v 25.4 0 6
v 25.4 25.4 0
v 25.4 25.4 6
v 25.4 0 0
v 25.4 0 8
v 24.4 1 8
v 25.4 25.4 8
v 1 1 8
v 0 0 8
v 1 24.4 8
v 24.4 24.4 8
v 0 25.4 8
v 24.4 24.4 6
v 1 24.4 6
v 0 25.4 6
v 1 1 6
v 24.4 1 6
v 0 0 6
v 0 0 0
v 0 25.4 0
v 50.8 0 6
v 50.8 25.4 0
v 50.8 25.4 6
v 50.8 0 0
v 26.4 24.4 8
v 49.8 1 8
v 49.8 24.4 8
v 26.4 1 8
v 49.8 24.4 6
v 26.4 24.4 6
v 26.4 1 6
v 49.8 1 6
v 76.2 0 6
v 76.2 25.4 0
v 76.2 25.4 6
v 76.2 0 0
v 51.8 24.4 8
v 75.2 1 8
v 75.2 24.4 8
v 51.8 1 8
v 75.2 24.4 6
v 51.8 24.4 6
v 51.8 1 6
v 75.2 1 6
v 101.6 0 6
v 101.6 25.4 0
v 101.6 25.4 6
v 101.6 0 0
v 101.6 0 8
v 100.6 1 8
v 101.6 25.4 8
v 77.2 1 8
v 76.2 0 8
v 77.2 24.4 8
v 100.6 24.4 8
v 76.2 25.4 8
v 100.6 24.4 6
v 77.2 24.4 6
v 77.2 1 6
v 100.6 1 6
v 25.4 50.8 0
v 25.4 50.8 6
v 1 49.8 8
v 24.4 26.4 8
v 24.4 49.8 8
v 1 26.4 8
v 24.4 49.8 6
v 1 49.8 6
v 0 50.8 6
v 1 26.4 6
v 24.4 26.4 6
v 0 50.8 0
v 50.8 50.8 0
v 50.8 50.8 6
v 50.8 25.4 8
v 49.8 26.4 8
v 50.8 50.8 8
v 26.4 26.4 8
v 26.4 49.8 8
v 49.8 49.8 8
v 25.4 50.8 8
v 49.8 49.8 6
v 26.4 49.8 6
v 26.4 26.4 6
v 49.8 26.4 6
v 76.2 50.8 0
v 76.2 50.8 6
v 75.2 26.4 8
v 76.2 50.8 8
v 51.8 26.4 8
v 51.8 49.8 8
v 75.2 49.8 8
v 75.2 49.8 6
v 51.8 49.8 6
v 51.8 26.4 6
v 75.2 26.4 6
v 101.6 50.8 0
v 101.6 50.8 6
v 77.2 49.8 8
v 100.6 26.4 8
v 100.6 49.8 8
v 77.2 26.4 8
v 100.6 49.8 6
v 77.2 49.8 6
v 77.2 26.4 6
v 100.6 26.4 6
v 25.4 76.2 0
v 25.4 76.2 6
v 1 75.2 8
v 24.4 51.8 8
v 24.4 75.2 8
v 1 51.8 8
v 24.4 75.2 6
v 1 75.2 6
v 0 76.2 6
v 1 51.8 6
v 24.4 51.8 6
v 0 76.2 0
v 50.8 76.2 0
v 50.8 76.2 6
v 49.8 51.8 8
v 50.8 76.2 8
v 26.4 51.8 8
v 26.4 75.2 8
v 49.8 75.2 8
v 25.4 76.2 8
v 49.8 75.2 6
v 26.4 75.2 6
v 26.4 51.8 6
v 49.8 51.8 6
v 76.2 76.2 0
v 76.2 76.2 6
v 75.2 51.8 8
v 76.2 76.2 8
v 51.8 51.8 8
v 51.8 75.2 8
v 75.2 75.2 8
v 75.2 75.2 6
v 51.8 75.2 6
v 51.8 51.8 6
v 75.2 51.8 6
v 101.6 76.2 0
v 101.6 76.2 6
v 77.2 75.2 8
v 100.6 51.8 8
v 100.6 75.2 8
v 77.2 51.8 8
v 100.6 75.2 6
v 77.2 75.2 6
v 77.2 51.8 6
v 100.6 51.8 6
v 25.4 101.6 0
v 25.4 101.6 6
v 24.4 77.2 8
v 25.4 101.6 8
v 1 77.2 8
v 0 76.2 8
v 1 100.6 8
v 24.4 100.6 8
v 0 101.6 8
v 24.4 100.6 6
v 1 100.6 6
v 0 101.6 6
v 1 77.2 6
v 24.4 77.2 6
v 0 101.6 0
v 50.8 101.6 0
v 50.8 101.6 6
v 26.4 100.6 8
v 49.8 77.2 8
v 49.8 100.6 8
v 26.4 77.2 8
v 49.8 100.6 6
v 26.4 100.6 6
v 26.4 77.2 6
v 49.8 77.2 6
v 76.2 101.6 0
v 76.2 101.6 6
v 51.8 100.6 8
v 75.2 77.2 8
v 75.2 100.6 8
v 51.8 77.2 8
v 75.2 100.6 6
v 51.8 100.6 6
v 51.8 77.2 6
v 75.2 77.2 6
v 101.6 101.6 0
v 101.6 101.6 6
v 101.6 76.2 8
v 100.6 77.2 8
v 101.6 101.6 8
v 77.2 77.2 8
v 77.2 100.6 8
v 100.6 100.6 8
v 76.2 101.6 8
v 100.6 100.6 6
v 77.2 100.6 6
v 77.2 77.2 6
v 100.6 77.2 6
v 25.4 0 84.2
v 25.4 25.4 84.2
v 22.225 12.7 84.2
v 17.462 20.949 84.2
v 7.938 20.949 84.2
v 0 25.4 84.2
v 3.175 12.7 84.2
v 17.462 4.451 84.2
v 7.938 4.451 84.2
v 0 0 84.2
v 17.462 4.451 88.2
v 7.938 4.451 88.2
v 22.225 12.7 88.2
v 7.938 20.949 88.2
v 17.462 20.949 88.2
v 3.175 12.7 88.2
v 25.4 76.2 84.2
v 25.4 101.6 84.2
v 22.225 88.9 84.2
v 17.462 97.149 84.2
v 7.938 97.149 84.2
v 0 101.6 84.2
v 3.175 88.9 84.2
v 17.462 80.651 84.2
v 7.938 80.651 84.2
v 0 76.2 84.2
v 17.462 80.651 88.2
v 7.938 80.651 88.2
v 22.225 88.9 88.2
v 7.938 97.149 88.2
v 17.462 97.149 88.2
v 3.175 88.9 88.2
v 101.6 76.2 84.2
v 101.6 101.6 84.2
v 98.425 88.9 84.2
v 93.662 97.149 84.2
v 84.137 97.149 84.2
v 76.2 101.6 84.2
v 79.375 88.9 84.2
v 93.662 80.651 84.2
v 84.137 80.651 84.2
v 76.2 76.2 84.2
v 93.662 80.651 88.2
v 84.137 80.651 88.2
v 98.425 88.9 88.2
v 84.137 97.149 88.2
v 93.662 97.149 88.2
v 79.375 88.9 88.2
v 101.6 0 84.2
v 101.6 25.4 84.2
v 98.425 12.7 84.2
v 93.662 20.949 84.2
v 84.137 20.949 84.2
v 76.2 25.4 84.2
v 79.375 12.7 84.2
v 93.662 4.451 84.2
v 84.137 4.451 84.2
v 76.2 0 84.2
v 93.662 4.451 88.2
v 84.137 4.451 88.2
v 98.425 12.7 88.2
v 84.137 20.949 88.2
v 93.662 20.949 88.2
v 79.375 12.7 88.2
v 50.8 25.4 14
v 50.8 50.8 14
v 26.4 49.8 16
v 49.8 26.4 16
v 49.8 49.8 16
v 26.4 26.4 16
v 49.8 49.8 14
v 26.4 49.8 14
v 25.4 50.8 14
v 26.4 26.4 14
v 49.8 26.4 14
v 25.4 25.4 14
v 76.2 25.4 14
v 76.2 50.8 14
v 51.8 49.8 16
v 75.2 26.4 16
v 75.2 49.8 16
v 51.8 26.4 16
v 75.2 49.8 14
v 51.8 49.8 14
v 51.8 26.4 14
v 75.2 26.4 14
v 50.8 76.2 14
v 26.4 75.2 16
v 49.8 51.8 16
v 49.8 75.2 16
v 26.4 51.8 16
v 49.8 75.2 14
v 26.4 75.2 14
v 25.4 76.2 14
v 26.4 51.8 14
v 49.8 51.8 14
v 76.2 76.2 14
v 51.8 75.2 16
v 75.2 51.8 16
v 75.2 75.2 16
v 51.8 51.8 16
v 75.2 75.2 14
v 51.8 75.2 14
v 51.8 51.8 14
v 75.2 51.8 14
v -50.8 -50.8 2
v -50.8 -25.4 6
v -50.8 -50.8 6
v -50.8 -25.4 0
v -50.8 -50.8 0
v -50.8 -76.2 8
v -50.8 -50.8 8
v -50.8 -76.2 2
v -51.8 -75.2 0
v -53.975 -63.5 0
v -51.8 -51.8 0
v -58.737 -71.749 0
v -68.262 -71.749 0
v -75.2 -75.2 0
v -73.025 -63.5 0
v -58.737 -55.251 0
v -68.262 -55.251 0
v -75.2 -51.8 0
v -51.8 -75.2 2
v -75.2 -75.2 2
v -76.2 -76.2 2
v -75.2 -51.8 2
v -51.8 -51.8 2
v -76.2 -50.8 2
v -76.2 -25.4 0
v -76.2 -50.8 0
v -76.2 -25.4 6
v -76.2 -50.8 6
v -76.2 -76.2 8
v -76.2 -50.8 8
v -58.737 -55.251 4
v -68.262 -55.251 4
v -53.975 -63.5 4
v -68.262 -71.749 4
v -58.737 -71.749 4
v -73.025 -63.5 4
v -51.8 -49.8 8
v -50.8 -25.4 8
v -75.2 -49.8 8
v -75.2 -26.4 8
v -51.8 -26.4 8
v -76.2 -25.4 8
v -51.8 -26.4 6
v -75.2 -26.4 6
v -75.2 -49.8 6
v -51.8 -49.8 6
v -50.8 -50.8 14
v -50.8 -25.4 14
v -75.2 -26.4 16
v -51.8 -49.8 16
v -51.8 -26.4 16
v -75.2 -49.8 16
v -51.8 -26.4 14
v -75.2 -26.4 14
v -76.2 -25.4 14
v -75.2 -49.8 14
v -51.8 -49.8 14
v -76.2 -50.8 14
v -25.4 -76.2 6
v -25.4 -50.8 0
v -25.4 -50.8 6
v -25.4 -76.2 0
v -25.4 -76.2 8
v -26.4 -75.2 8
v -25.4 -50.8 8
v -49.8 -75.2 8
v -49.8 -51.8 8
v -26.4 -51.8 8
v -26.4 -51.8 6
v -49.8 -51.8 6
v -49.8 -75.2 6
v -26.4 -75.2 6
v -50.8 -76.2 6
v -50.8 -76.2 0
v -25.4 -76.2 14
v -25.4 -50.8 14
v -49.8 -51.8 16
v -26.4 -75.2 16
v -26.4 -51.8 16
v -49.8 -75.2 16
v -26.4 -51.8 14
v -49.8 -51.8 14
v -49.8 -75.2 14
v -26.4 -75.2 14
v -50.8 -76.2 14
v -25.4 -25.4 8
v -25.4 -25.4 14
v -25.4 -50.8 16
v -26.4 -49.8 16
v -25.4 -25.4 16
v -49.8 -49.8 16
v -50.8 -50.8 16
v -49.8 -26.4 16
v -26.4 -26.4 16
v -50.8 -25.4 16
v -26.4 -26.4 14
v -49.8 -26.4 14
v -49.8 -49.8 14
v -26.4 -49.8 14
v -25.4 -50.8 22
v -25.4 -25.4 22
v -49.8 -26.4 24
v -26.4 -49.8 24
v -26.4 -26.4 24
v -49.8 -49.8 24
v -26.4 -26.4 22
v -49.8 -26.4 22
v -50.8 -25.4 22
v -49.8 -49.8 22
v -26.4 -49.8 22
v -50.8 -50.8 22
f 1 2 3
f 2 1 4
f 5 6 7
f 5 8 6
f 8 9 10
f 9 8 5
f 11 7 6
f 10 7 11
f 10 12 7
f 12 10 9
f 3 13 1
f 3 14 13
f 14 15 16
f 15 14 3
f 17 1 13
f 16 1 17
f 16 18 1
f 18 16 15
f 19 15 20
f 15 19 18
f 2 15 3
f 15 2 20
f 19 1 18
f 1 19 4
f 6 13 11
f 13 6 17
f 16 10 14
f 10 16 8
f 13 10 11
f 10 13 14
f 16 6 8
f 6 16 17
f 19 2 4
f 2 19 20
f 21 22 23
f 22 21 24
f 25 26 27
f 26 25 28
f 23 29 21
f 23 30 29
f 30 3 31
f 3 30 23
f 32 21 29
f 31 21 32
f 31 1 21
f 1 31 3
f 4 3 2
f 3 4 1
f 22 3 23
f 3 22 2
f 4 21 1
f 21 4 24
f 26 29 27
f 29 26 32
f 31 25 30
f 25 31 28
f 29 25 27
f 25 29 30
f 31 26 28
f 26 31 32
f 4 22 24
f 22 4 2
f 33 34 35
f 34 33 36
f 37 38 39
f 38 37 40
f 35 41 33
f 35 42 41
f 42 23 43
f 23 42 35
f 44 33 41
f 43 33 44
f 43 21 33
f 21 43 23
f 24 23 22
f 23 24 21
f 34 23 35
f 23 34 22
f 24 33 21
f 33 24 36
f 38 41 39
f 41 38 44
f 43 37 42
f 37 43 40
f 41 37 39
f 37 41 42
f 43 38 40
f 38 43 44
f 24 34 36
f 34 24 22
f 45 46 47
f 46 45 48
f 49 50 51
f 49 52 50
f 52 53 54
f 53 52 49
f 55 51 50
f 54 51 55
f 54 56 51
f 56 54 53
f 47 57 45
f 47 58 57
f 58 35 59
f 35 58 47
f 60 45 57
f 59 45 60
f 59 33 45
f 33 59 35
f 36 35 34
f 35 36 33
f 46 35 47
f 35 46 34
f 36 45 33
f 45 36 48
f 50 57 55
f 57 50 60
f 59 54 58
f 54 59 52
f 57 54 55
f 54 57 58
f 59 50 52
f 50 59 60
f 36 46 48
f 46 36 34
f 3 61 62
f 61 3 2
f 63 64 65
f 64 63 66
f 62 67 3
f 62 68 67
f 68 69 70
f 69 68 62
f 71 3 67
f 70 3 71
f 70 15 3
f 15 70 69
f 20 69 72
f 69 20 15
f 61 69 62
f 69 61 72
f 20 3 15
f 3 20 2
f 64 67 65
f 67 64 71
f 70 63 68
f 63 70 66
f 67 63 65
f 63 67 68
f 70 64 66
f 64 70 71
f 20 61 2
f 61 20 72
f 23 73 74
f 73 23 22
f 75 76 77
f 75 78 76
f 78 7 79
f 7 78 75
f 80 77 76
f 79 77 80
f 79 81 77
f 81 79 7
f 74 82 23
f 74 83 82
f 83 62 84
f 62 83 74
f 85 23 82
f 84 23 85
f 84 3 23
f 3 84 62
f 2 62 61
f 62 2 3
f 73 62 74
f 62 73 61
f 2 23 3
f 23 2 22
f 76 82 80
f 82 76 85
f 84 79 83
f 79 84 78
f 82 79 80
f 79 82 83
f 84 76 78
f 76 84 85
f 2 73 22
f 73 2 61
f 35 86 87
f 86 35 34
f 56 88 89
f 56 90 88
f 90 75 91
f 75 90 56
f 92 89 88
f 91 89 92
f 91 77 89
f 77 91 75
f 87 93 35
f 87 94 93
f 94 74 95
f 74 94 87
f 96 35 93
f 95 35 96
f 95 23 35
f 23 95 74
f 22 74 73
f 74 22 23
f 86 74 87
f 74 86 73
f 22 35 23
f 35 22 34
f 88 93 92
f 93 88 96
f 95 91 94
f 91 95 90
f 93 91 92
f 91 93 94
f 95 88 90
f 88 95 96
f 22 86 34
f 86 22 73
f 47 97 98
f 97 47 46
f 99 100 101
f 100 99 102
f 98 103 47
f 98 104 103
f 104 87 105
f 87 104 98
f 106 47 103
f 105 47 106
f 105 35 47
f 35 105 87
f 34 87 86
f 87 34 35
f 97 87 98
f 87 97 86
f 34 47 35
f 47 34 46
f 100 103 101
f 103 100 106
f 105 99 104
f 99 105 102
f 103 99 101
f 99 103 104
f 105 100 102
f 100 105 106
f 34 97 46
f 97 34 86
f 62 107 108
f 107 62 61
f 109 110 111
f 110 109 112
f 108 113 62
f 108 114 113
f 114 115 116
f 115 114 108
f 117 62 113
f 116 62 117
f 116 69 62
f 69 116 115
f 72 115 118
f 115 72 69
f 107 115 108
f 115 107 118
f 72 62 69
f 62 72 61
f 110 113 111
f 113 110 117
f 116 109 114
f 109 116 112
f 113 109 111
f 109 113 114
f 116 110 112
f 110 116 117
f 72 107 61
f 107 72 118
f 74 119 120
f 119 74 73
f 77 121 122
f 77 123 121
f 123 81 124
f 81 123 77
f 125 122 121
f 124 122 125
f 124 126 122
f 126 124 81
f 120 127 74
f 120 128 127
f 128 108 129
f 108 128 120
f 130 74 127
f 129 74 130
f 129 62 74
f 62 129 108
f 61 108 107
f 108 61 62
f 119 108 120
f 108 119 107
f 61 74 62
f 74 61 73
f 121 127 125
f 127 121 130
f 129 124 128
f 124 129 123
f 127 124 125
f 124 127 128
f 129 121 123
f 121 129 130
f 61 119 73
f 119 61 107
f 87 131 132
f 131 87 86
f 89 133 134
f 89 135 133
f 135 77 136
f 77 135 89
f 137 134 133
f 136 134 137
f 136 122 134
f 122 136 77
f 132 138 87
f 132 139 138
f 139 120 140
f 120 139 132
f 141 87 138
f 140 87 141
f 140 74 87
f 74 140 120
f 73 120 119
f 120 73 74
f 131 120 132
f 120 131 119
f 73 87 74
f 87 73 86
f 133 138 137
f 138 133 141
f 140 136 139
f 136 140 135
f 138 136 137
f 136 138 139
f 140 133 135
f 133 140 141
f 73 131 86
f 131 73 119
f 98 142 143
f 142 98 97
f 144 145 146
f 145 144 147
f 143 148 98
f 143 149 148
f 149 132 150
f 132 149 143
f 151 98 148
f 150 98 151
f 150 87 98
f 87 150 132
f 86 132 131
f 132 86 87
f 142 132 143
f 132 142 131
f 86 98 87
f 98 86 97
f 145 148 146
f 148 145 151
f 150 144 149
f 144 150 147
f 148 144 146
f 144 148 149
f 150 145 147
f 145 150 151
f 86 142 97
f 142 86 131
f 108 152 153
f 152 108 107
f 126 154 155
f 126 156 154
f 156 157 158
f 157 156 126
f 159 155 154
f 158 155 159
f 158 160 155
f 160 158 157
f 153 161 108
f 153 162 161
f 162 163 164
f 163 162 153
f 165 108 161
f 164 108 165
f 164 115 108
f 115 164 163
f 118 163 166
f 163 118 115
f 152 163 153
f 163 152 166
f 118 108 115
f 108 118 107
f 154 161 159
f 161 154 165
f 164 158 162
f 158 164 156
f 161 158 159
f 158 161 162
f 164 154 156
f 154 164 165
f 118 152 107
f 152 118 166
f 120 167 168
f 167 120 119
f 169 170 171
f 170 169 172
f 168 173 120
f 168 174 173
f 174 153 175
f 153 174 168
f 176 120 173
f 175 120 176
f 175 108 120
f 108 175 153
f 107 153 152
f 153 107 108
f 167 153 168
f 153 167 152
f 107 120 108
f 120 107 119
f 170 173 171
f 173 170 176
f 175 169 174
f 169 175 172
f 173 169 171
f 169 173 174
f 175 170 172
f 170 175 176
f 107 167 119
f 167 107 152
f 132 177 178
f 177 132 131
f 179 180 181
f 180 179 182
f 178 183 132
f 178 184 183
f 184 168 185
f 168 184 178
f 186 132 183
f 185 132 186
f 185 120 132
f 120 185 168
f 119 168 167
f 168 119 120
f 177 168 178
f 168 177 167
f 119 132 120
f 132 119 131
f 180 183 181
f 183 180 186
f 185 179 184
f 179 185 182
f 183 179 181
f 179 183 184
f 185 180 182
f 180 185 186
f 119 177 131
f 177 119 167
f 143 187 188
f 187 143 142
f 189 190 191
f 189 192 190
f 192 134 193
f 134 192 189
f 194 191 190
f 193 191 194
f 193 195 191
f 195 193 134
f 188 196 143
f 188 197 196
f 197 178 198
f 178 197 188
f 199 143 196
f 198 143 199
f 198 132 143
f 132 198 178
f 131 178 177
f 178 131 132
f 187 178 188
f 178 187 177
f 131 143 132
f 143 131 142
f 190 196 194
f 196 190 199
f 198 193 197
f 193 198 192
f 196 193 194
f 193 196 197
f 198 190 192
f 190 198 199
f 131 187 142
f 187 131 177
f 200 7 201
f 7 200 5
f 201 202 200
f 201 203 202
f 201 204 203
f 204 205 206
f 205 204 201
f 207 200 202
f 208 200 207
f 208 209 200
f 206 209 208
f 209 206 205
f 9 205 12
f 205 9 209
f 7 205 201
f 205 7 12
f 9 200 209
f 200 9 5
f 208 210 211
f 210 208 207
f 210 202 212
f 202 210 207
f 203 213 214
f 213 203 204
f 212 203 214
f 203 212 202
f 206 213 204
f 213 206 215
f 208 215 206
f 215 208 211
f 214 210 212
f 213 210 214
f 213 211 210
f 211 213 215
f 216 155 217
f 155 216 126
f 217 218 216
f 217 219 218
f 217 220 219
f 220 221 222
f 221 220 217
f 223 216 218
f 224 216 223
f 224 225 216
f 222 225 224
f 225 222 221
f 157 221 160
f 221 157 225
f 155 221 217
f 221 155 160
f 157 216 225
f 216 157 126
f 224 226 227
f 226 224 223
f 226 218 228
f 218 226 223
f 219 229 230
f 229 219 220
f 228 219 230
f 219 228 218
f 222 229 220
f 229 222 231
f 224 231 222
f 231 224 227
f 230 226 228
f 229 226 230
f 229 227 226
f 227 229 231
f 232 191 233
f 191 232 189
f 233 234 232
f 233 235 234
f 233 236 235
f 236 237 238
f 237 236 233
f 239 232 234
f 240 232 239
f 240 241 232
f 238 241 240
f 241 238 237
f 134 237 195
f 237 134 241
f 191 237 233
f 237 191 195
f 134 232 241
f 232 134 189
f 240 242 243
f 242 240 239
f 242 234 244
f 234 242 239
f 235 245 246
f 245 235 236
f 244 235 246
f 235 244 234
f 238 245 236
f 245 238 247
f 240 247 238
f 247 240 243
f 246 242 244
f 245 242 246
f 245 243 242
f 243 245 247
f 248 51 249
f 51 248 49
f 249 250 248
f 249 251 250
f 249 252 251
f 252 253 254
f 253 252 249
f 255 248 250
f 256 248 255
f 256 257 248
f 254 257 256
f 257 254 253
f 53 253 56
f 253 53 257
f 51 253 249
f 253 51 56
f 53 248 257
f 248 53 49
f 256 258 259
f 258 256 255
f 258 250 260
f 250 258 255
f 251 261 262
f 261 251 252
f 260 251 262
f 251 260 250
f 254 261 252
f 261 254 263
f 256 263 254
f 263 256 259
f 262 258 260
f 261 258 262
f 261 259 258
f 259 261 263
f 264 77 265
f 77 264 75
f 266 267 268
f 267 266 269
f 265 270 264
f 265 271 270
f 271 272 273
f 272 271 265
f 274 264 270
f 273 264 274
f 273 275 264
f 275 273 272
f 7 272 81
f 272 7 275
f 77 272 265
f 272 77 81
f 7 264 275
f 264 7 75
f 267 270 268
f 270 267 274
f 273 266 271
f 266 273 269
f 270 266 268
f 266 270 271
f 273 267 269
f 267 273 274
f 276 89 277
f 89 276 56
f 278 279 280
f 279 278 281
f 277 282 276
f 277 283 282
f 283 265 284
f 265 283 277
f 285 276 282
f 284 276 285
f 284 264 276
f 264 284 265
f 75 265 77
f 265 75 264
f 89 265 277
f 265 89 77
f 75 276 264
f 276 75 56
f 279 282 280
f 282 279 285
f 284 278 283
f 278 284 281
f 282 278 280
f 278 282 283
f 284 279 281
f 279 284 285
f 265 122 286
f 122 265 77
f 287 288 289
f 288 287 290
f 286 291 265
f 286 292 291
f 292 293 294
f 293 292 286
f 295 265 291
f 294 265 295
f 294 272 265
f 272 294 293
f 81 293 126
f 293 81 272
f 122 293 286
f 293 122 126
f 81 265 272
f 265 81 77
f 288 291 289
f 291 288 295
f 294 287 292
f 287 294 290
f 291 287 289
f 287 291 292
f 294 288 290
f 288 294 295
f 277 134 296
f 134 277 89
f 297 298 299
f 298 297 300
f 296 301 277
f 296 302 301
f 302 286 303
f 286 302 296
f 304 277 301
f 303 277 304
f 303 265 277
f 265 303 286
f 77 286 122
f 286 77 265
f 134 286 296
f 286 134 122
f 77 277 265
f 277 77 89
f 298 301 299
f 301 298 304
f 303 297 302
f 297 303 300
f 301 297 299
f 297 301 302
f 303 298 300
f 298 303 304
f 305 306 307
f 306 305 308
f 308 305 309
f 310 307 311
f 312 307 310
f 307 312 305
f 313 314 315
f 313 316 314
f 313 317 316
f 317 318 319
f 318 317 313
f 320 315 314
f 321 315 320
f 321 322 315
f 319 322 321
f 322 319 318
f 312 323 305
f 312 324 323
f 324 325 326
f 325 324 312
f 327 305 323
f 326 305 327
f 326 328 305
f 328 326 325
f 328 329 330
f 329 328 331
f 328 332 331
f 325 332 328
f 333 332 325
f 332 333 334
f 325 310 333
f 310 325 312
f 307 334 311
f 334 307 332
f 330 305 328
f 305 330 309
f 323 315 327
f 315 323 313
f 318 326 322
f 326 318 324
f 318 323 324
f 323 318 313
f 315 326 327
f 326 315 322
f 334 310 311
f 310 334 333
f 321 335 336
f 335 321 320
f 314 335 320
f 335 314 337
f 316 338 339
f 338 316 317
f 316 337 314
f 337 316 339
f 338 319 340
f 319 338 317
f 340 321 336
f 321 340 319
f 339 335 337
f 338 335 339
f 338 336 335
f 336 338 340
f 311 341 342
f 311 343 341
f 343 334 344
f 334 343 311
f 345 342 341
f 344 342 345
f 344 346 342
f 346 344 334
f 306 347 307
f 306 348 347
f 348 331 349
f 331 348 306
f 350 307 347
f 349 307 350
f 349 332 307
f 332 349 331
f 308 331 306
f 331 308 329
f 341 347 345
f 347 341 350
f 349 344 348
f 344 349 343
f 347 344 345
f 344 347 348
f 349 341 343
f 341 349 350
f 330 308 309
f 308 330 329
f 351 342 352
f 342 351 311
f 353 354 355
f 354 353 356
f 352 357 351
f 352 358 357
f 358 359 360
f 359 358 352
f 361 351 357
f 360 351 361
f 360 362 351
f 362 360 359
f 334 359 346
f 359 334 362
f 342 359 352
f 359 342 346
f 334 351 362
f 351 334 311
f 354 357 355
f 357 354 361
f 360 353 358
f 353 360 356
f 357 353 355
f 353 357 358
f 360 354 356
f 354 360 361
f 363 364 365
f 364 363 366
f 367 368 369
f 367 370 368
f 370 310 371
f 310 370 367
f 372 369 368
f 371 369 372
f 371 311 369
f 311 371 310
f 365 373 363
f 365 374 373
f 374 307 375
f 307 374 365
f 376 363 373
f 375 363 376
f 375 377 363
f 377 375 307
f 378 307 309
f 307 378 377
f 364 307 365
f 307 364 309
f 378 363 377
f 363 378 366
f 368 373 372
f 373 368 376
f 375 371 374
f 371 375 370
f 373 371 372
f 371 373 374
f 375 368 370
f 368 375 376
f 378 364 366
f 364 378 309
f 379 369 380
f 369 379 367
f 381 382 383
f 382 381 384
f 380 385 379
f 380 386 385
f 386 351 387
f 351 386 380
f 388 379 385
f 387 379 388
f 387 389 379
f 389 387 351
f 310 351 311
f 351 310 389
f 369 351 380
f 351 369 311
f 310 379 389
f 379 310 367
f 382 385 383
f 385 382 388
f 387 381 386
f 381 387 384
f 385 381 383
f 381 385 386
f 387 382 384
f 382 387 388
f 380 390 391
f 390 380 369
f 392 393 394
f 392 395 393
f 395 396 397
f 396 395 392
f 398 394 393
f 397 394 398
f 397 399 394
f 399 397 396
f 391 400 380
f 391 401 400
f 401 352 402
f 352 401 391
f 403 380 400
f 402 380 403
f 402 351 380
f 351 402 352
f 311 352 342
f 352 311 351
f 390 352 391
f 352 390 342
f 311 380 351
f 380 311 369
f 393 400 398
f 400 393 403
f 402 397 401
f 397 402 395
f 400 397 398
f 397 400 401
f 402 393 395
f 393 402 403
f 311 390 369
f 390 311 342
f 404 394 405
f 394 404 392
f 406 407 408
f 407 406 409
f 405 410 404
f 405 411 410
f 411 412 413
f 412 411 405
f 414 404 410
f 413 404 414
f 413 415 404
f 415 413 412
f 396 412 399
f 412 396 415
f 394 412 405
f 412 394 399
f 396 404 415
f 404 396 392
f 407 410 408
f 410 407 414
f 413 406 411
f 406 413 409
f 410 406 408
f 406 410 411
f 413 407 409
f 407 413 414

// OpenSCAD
// file: ../DND Play Area Tiles.scad
/**
 * @brief This file contains various types of tiles and other modules for non-assembled/arranged pieces
 * TODO Add textures to tiles
 * TODO Tile square module
 * TODO Tile circle module
 * TODO Basic tile replacement module
 * TODO Wall modules
 */

include <DND Play Area Config.scad>;

/**
 * @brief Basic tile to use for floors
 * @param _center Whether or not to center the tile
 */
module basic_tile(_center=false, _thickness=TILE_THICKNESS) {
    if (DIP_OUTSIDE_SQUARE) {
        difference() {
            // Main tile piece
            cube([SQUARE_SIZE+DIP_DIMENSIONS,SQUARE_SIZE+DIP_DIMENSIONS,_thickness],_center);
            // Tile dip
            translate([0,0,(TILE_THICKNESS*_thickness)-DIP_DIMENSIONS])
                difference() {
                    cube([SQUARE_SIZE+DIP_DIMENSIONS,SQUARE_SIZE+DIP_DIMENSIONS,DIP_DIMENSIONS],_center);
                    translate([DIP_DIMENSIONS/2,DIP_DIMENSIONS/2,0])
                        cube([SQUARE_SIZE,SQUARE_SIZE,DIP_DIMENSIONS],_center);
                }
        }
    } else {
        difference() {
            // Main tile piece
            cube([SQUARE_SIZE,SQUARE_SIZE,_thickness],_center);
            // Tile dip
            translate([0,0,_thickness-DIP_DIMENSIONS])
                difference() {
                    cube([SQUARE_SIZE,SQUARE_SIZE,DIP_DIMENSIONS],_center);
                    translate([DIP_DIMENSIONS/2,DIP_DIMENSIONS/2,0])
                        cube([SQUARE_SIZE-DIP_DIMENSIONS,SQUARE_SIZE-DIP_DIMENSIONS,DIP_DIMENSIONS],_center);
                }
        }
    }
}

/**
 * @brief This tile can be placed on play areas to link them to other pieces.
 * @param _center Whether or not to center the tile
 * @param _bothsides Whether the connection hole should be on both sides or just the top one
 */
module connection_tile(_center=false,_bothsides=false) {
    translate_amount = DIP_OUTSIDE_SQUARE ? (SQUARE_SIZE+DIP_DIMENSIONS)/2 : SQUARE_SIZE/2;
    difference() {
        basic_tile(_center);
        translate([translate_amount,translate_amount,_bothsides ? 0 : TILE_THICKNESS/2])
            scale([1,1,_bothsides ? 2 : 1])
                connection_shape(_center);
    }
}

/**
 * TODO this should just be an option on the regular connection tile, but for now it'll be here
 */
module flipped_connection_tile() {
    rotate([180,0,0])
        translate([0,-SQUARE_SIZE,-TILE_THICKNESS])
            connection_tile();
}

/**
 * @brief Column for connecting pieces vertically
 * @param _connection_column_height Height of the column in play area squares
 * @param _top_connector If the connection piece on the top should be included
 * @param _bottom_connector If the connection piece on the bottom should be included
 */
module connection_column(_connection_column_height=CONNECTION_COLUMN_HEIGHT,_top_connector=true,_bottom_connector=true,_center=false) {
    column_offset = _bottom_connector ? CONNECTION_PEG_HEIGHT : 0;
    connection_column_height=SQUARE_SIZE*_connection_column_height - column_offset;
    if (_bottom_connector)
        connection_shape();
    if (_top_connector) {
        translate([0,0,column_offset])
            cube([SQUARE_SIZE,SQUARE_SIZE,connection_column_height],_center);
        translate([0,0,column_offset+connection_column_height])
            connection_shape();
    } else {
        no_top_column_height = connection_column_height-SQUARE_SIZE-CONNECTION_PEG_HEIGHT;
        translate([0,0,CONNECTION_PEG_HEIGHT]) {
            cube([SQUARE_SIZE,SQUARE_SIZE,no_top_column_height],_center);
            translate([0,0,no_top_column_height])
                basic_tile(_thickness=SQUARE_SIZE,_center=_center);
        }
    }
}

/**
 * @brief Creates a line of basic tiles of a specified length
 */
module tile_line(_length) {
    for(i=[0:_length-1])
        translate([i*SQUARE_SIZE,0,0])
            basic_tile();
}

/**
 * @brief Creates a rectangle of basic tiles
 */
module tile_rectangle(_length,_width) {
    for(i=[0:_width-1])
        translate([0,i*SQUARE_SIZE,0])
            tile_line(_length);
}

/**
 * @brief Creates a rectangle to fit between two points
 * @param _cordsOne Array(3) of points (x,y,z), used as rectangles home (should be to the right of _cordsTwo
 * @param _cordsTwo Array(3) of points (x,y,z)
 */
module tile_rectangle_between_points(_cordsOne, _cordsTwo) {
    translate(tile_coordinates(_cordsOne[0],_cordsOne[1],_cordsOne[2])) {
        
        rectX = (_cordsOne[0] == _cordsTwo[0]) ? 1 :  abs(_cordsOne[0]-_cordsTwo[0]);
        
        rectY = (_cordsOne[1] == _cordsTwo[1]) ? 1 : abs(_cordsOne[1]-_cordsTwo[1]);
        
        tile_rectangle(rectX,rectY);
    }
}
// file: ../DND Play Area Config.scad
/** Size of each square floor tile */
SQUARE_SIZE = 25.4;
/** Thickness of tiles*/
TILE_THICKNESS = 8;
/** Width and thickness of the dip between tiles */
DIP_DIMENSIONS = TILE_THICKNESS*0.25;
/** Scale of the connection shape to use for the indents into blocks (so that other pieces fit in them) */
CONNECTION_HOLE_SCALE = 1.05;
/** Diameter of the connection holes/pegs */
CONNECTION_PEG_DIAMETER = SQUARE_SIZE*0.75;
/** Height of the connection peg */
CONNECTION_PEG_HEIGHT = TILE_THICKNESS/2;
/** Total height that needs to be added to squares to connect them upwards diagonally */
VERTICAL_TILE_CONNECTION_HEIGHT = CONNECTION_PEG_HEIGHT + DIP_DIMENSIONS;
/** Height of connection columns in number of squares (for multi-level buildings this is the standard height of one floor) */
CONNECTION_COLUMN_HEIGHT = 3;
/** Whether the dip should come outside the square size or if it should be included */
DIP_OUTSIDE_SQUARE = false; // Some things are currently not configured for the dip being outside the square

/**
 * @brief This shape is used to connect various pieces together
 * @param _center Center the connection shape to where it should be to be located in the center of a tile
 */
module connection_shape(_center=true) {
    t_arr = _center ? [CONNECTION_PEG_DIAMETER/2+SQUARE_SIZE/8,CONNECTION_PEG_DIAMETER/2+SQUARE_SIZE/8,0] :[0,0,0] ;
    translate(t_arr)
        cylinder($fn=6,d=CONNECTION_PEG_DIAMETER,h=CONNECTION_PEG_HEIGHT);
}

/**
 * @brief Arranges this shape to be cutout of a tile
 */
module cutout_connection_shape(_bothSides=false,_center=false) {
    translate_amount = DIP_OUTSIDE_SQUARE ? (SQUARE_SIZE+DIP_DIMENSIONS)/2 : SQUARE_SIZE/2;
    translate([translate_amount,translate_amount,_bothSides ? 0 : TILE_THICKNESS/2])
        scale([1,1,_bothSides ? 2 : 1])
            connection_shape(_center);
}

/**
 * @brief Converts numbers into tile size for use as coordinates
 */
function tile_coordinates(_x,_y,_z) = [_x*SQUARE_SIZE,_y*SQUARE_SIZE,_z*SQUARE_SIZE];

/**
 * @brief Translates an object using the tile coordinate system
 * @param _point Point to translate to
 */
module tile_translate(_point) {
    for(i=[0:$children-1])
        translate(tile_coordinates(_point[0],_point[1],_point[2]))
            children(i);
}
// main file
/**
 * @brief Defines a structure for placing a figure on with raised
 * pieces to place curse markers on.
 */

include <../DND Play Area Config.scad>;
use <../DND Play Area Tiles.scad>;

/**
 * The main base of the alter. Should be big enough to fit most 
 * medium sized creatures on.
 */
module alter_base() {
    tile_rectangle(4,4);
    translate([0,0,TILE_THICKNESS]) {
        connection_column(_bottom_connector=false);
        translate(tile_coordinates(0,3,0))
            connection_column(_bottom_connector=false);
        translate(tile_coordinates(3,3,0))
            connection_column(_bottom_connector=false);
        translate(tile_coordinates(3,0,0))
            connection_column(_bottom_connector=false);
        translate(tile_coordinates(1,1,0))
            tile_rectangle(2,2);
    }
}

/**
 * @brief Creates a stack of tiles to simulate stairs
 * @param _height How many tiles should be in the stack
 */
module tile_stair(_height=2) {
    for(i=[0:_height-1]) {
        translate([0,0,TILE_THICKNESS*i]) {   
            basic_tile();
        }
    }
}

module alter_attachmemt() {
    flipped_connection_tile();
    translate(tile_coordinates(0,1,0))
        tile_stair();
    translate(tile_coordinates(1,0,0))
        tile_stair();
    translate(tile_coordinates(1,1,0))
        translate([0,0,TILE_THICKNESS])
            tile_stair();
}
//render() 
alter_base();
translate(tile_coordinates(-3,-3,0))
    alter_attachmemt();
    
